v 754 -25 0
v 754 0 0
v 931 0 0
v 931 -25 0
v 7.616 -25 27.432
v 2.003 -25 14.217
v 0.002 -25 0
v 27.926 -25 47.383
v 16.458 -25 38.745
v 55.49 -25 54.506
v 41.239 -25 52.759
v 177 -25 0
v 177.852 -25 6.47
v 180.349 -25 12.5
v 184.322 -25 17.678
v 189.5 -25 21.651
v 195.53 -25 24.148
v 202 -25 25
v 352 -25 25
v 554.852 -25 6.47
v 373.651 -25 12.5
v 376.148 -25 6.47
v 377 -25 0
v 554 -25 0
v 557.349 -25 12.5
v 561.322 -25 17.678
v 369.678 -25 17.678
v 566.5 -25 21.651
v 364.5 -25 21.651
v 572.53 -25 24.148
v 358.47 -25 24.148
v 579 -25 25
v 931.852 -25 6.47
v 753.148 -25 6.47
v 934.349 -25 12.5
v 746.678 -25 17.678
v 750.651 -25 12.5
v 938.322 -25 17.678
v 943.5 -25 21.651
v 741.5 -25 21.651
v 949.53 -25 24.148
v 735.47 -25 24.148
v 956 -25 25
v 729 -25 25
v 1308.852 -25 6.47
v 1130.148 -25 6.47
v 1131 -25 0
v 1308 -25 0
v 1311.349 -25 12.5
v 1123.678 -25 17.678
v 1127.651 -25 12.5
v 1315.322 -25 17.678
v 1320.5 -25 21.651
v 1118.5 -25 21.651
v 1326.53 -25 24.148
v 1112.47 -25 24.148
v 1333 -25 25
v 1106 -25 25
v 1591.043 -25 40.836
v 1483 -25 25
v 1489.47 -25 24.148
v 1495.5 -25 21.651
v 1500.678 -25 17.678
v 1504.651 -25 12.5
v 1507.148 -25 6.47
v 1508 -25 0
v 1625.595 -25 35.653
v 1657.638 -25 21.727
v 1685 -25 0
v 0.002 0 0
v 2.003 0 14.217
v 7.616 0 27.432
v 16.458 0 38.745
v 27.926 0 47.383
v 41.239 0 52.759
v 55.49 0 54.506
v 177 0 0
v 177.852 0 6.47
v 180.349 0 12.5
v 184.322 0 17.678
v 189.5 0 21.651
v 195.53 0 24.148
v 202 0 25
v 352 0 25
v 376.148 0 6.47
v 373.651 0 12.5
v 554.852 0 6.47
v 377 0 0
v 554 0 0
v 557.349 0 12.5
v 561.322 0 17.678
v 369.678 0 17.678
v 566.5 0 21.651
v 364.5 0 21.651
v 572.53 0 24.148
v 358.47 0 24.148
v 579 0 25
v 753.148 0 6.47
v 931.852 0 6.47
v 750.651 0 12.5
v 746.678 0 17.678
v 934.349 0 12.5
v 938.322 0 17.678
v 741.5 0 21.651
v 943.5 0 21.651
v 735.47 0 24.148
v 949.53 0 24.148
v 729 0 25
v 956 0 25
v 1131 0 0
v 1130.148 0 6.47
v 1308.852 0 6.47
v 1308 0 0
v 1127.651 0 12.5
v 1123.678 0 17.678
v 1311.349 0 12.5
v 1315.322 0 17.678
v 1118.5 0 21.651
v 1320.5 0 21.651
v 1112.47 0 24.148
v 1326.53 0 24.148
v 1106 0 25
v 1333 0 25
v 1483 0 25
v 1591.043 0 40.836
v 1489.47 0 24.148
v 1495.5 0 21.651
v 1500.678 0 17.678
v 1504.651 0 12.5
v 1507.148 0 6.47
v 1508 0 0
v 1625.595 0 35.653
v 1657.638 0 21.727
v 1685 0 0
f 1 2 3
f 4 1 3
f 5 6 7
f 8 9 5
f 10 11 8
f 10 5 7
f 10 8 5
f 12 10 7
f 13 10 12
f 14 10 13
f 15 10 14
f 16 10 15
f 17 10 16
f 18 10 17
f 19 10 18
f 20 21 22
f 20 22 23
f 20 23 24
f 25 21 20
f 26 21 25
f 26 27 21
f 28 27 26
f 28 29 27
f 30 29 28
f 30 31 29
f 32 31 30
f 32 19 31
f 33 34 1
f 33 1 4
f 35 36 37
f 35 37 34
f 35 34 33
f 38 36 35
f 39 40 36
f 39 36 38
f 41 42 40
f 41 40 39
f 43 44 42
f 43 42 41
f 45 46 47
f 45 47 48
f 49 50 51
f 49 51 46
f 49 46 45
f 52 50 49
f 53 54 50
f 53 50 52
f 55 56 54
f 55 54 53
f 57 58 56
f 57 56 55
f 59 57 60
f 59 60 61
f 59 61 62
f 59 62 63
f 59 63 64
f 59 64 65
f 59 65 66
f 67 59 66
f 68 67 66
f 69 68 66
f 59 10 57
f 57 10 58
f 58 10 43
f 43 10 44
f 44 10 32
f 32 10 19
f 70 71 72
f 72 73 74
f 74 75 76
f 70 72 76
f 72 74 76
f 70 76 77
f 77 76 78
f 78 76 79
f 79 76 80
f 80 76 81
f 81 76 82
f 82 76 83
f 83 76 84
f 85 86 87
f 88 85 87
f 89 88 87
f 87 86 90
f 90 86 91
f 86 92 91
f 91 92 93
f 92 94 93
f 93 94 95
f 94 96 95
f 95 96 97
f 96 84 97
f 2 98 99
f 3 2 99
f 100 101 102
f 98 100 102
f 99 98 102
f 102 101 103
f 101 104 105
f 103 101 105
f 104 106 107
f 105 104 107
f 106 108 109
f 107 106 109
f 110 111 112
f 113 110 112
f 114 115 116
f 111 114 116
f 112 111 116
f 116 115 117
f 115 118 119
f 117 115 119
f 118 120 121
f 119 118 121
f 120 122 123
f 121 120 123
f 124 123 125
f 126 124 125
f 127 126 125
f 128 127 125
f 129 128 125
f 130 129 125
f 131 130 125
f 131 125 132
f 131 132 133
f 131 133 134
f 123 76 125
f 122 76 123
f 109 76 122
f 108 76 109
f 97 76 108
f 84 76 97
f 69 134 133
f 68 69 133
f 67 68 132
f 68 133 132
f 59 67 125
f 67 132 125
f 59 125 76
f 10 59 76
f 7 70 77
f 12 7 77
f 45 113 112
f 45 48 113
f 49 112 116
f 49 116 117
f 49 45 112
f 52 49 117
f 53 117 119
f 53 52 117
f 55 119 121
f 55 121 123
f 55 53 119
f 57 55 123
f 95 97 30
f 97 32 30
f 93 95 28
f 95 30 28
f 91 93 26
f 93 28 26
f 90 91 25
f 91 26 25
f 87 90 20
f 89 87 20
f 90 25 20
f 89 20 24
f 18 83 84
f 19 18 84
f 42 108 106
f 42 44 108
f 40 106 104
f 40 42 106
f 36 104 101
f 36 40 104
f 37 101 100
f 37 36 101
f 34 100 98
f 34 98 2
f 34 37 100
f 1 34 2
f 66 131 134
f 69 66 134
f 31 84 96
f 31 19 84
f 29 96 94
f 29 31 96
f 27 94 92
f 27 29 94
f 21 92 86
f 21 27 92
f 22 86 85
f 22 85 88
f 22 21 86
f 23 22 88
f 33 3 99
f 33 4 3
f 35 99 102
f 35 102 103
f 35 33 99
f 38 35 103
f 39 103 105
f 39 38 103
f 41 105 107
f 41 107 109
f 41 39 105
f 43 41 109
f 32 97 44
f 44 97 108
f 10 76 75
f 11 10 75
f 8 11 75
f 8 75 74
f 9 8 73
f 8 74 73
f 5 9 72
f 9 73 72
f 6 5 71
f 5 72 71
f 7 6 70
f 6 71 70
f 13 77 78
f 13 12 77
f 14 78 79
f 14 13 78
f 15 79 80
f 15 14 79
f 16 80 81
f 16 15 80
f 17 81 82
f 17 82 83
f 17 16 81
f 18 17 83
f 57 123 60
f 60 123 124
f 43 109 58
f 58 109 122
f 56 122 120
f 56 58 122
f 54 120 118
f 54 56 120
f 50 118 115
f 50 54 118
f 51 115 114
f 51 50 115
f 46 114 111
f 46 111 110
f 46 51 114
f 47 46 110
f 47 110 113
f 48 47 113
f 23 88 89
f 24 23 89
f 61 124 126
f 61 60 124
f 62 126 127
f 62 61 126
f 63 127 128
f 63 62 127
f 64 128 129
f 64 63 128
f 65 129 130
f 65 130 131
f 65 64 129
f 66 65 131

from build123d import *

# Parameters (mm, degrees)
F1_DEPTH = 25
F2_R     = 24.99999
F3_R     = 24.99999
F4_R     = 24.99999
F5_R     = 24.99999


# Not quite as in the source:
# - a fillet or chamfer is up to 0.001 mm smaller than in the source, because OpenCascade refuses the exact size


with BuildPart() as f1:
    # F0 (on Front) → F1 (new body)
    with BuildSketch(Plane.XZ):
        with BuildLine():
            ThreePointArc((55.4895948443, 54.5060273456), (16.4576480368, 38.7445048189), (0.0021987788, 0))
            Line((0.0021987788, 0), (177, 0))
            Line((177, 0), (177, 25))
            Line((177, 25), (377, 25))
            Line((377, 25), (377, 0))
            Line((377, 0), (554, 0))
            Line((554, 0), (554, 25))
            Line((554, 25), (754, 25))
            Line((754, 25), (754, 0))
            Line((754, 0), (931, 0))
            Line((931, 0), (931, 25))
            Line((931, 25), (1131, 25))
            Line((1131, 25), (1131, 0))
            Line((1131, 0), (1308, 0))
            Line((1308, 0), (1308, 25))
            Line((1308, 25), (1508, 25))
            Line((1508, 25), (1508, 0))
            Line((1508, 0), (1685, 0))
            ThreePointArc((1685, 0), (1642.0718401331, 29.7373237733), (1591.0429702736, 40.8364127275))
            Line((1591.0429702736, 40.8364127275), (55.4895948443, 54.5060273456))
        make_face()
    extrude(amount=F1_DEPTH)

    # F2 (radius 25 in the source; OpenCascade refuses exactly that, so slightly less here)
    f2_edges = [f1.edges().sort_by_distance(p)[0] for p in [
        (177, -12.5, 25),
    ]]
    fillet(f2_edges, radius=F2_R)

    # F3 (radius 25 in the source; OpenCascade refuses exactly that, so slightly less here)
    f3_edges = [f1.edges().sort_by_distance(p)[0] for p in [
        (377, -12.5, 25),
    ]]
    fillet(f3_edges, radius=F3_R)

    # F4 (radius 25 in the source; OpenCascade refuses exactly that, so slightly less here)
    f4_edges = [f1.edges().sort_by_distance(p)[0] for p in [
        (754, -12.5, 25),
        (1131, -12.5, 25),
    ]]
    fillet(f4_edges, radius=F4_R)

    # F5 (radius 25 in the source; OpenCascade refuses exactly that, so slightly less here)
    f5_edges = [f1.edges().sort_by_distance(p)[0] for p in [
        (1508, -12.5, 25),
        (554, -12.5, 25),
        (931, -12.5, 25),
        (1308, -12.5, 25),
    ]]
    fillet(f5_edges, radius=F5_R)


solid = f1.part
